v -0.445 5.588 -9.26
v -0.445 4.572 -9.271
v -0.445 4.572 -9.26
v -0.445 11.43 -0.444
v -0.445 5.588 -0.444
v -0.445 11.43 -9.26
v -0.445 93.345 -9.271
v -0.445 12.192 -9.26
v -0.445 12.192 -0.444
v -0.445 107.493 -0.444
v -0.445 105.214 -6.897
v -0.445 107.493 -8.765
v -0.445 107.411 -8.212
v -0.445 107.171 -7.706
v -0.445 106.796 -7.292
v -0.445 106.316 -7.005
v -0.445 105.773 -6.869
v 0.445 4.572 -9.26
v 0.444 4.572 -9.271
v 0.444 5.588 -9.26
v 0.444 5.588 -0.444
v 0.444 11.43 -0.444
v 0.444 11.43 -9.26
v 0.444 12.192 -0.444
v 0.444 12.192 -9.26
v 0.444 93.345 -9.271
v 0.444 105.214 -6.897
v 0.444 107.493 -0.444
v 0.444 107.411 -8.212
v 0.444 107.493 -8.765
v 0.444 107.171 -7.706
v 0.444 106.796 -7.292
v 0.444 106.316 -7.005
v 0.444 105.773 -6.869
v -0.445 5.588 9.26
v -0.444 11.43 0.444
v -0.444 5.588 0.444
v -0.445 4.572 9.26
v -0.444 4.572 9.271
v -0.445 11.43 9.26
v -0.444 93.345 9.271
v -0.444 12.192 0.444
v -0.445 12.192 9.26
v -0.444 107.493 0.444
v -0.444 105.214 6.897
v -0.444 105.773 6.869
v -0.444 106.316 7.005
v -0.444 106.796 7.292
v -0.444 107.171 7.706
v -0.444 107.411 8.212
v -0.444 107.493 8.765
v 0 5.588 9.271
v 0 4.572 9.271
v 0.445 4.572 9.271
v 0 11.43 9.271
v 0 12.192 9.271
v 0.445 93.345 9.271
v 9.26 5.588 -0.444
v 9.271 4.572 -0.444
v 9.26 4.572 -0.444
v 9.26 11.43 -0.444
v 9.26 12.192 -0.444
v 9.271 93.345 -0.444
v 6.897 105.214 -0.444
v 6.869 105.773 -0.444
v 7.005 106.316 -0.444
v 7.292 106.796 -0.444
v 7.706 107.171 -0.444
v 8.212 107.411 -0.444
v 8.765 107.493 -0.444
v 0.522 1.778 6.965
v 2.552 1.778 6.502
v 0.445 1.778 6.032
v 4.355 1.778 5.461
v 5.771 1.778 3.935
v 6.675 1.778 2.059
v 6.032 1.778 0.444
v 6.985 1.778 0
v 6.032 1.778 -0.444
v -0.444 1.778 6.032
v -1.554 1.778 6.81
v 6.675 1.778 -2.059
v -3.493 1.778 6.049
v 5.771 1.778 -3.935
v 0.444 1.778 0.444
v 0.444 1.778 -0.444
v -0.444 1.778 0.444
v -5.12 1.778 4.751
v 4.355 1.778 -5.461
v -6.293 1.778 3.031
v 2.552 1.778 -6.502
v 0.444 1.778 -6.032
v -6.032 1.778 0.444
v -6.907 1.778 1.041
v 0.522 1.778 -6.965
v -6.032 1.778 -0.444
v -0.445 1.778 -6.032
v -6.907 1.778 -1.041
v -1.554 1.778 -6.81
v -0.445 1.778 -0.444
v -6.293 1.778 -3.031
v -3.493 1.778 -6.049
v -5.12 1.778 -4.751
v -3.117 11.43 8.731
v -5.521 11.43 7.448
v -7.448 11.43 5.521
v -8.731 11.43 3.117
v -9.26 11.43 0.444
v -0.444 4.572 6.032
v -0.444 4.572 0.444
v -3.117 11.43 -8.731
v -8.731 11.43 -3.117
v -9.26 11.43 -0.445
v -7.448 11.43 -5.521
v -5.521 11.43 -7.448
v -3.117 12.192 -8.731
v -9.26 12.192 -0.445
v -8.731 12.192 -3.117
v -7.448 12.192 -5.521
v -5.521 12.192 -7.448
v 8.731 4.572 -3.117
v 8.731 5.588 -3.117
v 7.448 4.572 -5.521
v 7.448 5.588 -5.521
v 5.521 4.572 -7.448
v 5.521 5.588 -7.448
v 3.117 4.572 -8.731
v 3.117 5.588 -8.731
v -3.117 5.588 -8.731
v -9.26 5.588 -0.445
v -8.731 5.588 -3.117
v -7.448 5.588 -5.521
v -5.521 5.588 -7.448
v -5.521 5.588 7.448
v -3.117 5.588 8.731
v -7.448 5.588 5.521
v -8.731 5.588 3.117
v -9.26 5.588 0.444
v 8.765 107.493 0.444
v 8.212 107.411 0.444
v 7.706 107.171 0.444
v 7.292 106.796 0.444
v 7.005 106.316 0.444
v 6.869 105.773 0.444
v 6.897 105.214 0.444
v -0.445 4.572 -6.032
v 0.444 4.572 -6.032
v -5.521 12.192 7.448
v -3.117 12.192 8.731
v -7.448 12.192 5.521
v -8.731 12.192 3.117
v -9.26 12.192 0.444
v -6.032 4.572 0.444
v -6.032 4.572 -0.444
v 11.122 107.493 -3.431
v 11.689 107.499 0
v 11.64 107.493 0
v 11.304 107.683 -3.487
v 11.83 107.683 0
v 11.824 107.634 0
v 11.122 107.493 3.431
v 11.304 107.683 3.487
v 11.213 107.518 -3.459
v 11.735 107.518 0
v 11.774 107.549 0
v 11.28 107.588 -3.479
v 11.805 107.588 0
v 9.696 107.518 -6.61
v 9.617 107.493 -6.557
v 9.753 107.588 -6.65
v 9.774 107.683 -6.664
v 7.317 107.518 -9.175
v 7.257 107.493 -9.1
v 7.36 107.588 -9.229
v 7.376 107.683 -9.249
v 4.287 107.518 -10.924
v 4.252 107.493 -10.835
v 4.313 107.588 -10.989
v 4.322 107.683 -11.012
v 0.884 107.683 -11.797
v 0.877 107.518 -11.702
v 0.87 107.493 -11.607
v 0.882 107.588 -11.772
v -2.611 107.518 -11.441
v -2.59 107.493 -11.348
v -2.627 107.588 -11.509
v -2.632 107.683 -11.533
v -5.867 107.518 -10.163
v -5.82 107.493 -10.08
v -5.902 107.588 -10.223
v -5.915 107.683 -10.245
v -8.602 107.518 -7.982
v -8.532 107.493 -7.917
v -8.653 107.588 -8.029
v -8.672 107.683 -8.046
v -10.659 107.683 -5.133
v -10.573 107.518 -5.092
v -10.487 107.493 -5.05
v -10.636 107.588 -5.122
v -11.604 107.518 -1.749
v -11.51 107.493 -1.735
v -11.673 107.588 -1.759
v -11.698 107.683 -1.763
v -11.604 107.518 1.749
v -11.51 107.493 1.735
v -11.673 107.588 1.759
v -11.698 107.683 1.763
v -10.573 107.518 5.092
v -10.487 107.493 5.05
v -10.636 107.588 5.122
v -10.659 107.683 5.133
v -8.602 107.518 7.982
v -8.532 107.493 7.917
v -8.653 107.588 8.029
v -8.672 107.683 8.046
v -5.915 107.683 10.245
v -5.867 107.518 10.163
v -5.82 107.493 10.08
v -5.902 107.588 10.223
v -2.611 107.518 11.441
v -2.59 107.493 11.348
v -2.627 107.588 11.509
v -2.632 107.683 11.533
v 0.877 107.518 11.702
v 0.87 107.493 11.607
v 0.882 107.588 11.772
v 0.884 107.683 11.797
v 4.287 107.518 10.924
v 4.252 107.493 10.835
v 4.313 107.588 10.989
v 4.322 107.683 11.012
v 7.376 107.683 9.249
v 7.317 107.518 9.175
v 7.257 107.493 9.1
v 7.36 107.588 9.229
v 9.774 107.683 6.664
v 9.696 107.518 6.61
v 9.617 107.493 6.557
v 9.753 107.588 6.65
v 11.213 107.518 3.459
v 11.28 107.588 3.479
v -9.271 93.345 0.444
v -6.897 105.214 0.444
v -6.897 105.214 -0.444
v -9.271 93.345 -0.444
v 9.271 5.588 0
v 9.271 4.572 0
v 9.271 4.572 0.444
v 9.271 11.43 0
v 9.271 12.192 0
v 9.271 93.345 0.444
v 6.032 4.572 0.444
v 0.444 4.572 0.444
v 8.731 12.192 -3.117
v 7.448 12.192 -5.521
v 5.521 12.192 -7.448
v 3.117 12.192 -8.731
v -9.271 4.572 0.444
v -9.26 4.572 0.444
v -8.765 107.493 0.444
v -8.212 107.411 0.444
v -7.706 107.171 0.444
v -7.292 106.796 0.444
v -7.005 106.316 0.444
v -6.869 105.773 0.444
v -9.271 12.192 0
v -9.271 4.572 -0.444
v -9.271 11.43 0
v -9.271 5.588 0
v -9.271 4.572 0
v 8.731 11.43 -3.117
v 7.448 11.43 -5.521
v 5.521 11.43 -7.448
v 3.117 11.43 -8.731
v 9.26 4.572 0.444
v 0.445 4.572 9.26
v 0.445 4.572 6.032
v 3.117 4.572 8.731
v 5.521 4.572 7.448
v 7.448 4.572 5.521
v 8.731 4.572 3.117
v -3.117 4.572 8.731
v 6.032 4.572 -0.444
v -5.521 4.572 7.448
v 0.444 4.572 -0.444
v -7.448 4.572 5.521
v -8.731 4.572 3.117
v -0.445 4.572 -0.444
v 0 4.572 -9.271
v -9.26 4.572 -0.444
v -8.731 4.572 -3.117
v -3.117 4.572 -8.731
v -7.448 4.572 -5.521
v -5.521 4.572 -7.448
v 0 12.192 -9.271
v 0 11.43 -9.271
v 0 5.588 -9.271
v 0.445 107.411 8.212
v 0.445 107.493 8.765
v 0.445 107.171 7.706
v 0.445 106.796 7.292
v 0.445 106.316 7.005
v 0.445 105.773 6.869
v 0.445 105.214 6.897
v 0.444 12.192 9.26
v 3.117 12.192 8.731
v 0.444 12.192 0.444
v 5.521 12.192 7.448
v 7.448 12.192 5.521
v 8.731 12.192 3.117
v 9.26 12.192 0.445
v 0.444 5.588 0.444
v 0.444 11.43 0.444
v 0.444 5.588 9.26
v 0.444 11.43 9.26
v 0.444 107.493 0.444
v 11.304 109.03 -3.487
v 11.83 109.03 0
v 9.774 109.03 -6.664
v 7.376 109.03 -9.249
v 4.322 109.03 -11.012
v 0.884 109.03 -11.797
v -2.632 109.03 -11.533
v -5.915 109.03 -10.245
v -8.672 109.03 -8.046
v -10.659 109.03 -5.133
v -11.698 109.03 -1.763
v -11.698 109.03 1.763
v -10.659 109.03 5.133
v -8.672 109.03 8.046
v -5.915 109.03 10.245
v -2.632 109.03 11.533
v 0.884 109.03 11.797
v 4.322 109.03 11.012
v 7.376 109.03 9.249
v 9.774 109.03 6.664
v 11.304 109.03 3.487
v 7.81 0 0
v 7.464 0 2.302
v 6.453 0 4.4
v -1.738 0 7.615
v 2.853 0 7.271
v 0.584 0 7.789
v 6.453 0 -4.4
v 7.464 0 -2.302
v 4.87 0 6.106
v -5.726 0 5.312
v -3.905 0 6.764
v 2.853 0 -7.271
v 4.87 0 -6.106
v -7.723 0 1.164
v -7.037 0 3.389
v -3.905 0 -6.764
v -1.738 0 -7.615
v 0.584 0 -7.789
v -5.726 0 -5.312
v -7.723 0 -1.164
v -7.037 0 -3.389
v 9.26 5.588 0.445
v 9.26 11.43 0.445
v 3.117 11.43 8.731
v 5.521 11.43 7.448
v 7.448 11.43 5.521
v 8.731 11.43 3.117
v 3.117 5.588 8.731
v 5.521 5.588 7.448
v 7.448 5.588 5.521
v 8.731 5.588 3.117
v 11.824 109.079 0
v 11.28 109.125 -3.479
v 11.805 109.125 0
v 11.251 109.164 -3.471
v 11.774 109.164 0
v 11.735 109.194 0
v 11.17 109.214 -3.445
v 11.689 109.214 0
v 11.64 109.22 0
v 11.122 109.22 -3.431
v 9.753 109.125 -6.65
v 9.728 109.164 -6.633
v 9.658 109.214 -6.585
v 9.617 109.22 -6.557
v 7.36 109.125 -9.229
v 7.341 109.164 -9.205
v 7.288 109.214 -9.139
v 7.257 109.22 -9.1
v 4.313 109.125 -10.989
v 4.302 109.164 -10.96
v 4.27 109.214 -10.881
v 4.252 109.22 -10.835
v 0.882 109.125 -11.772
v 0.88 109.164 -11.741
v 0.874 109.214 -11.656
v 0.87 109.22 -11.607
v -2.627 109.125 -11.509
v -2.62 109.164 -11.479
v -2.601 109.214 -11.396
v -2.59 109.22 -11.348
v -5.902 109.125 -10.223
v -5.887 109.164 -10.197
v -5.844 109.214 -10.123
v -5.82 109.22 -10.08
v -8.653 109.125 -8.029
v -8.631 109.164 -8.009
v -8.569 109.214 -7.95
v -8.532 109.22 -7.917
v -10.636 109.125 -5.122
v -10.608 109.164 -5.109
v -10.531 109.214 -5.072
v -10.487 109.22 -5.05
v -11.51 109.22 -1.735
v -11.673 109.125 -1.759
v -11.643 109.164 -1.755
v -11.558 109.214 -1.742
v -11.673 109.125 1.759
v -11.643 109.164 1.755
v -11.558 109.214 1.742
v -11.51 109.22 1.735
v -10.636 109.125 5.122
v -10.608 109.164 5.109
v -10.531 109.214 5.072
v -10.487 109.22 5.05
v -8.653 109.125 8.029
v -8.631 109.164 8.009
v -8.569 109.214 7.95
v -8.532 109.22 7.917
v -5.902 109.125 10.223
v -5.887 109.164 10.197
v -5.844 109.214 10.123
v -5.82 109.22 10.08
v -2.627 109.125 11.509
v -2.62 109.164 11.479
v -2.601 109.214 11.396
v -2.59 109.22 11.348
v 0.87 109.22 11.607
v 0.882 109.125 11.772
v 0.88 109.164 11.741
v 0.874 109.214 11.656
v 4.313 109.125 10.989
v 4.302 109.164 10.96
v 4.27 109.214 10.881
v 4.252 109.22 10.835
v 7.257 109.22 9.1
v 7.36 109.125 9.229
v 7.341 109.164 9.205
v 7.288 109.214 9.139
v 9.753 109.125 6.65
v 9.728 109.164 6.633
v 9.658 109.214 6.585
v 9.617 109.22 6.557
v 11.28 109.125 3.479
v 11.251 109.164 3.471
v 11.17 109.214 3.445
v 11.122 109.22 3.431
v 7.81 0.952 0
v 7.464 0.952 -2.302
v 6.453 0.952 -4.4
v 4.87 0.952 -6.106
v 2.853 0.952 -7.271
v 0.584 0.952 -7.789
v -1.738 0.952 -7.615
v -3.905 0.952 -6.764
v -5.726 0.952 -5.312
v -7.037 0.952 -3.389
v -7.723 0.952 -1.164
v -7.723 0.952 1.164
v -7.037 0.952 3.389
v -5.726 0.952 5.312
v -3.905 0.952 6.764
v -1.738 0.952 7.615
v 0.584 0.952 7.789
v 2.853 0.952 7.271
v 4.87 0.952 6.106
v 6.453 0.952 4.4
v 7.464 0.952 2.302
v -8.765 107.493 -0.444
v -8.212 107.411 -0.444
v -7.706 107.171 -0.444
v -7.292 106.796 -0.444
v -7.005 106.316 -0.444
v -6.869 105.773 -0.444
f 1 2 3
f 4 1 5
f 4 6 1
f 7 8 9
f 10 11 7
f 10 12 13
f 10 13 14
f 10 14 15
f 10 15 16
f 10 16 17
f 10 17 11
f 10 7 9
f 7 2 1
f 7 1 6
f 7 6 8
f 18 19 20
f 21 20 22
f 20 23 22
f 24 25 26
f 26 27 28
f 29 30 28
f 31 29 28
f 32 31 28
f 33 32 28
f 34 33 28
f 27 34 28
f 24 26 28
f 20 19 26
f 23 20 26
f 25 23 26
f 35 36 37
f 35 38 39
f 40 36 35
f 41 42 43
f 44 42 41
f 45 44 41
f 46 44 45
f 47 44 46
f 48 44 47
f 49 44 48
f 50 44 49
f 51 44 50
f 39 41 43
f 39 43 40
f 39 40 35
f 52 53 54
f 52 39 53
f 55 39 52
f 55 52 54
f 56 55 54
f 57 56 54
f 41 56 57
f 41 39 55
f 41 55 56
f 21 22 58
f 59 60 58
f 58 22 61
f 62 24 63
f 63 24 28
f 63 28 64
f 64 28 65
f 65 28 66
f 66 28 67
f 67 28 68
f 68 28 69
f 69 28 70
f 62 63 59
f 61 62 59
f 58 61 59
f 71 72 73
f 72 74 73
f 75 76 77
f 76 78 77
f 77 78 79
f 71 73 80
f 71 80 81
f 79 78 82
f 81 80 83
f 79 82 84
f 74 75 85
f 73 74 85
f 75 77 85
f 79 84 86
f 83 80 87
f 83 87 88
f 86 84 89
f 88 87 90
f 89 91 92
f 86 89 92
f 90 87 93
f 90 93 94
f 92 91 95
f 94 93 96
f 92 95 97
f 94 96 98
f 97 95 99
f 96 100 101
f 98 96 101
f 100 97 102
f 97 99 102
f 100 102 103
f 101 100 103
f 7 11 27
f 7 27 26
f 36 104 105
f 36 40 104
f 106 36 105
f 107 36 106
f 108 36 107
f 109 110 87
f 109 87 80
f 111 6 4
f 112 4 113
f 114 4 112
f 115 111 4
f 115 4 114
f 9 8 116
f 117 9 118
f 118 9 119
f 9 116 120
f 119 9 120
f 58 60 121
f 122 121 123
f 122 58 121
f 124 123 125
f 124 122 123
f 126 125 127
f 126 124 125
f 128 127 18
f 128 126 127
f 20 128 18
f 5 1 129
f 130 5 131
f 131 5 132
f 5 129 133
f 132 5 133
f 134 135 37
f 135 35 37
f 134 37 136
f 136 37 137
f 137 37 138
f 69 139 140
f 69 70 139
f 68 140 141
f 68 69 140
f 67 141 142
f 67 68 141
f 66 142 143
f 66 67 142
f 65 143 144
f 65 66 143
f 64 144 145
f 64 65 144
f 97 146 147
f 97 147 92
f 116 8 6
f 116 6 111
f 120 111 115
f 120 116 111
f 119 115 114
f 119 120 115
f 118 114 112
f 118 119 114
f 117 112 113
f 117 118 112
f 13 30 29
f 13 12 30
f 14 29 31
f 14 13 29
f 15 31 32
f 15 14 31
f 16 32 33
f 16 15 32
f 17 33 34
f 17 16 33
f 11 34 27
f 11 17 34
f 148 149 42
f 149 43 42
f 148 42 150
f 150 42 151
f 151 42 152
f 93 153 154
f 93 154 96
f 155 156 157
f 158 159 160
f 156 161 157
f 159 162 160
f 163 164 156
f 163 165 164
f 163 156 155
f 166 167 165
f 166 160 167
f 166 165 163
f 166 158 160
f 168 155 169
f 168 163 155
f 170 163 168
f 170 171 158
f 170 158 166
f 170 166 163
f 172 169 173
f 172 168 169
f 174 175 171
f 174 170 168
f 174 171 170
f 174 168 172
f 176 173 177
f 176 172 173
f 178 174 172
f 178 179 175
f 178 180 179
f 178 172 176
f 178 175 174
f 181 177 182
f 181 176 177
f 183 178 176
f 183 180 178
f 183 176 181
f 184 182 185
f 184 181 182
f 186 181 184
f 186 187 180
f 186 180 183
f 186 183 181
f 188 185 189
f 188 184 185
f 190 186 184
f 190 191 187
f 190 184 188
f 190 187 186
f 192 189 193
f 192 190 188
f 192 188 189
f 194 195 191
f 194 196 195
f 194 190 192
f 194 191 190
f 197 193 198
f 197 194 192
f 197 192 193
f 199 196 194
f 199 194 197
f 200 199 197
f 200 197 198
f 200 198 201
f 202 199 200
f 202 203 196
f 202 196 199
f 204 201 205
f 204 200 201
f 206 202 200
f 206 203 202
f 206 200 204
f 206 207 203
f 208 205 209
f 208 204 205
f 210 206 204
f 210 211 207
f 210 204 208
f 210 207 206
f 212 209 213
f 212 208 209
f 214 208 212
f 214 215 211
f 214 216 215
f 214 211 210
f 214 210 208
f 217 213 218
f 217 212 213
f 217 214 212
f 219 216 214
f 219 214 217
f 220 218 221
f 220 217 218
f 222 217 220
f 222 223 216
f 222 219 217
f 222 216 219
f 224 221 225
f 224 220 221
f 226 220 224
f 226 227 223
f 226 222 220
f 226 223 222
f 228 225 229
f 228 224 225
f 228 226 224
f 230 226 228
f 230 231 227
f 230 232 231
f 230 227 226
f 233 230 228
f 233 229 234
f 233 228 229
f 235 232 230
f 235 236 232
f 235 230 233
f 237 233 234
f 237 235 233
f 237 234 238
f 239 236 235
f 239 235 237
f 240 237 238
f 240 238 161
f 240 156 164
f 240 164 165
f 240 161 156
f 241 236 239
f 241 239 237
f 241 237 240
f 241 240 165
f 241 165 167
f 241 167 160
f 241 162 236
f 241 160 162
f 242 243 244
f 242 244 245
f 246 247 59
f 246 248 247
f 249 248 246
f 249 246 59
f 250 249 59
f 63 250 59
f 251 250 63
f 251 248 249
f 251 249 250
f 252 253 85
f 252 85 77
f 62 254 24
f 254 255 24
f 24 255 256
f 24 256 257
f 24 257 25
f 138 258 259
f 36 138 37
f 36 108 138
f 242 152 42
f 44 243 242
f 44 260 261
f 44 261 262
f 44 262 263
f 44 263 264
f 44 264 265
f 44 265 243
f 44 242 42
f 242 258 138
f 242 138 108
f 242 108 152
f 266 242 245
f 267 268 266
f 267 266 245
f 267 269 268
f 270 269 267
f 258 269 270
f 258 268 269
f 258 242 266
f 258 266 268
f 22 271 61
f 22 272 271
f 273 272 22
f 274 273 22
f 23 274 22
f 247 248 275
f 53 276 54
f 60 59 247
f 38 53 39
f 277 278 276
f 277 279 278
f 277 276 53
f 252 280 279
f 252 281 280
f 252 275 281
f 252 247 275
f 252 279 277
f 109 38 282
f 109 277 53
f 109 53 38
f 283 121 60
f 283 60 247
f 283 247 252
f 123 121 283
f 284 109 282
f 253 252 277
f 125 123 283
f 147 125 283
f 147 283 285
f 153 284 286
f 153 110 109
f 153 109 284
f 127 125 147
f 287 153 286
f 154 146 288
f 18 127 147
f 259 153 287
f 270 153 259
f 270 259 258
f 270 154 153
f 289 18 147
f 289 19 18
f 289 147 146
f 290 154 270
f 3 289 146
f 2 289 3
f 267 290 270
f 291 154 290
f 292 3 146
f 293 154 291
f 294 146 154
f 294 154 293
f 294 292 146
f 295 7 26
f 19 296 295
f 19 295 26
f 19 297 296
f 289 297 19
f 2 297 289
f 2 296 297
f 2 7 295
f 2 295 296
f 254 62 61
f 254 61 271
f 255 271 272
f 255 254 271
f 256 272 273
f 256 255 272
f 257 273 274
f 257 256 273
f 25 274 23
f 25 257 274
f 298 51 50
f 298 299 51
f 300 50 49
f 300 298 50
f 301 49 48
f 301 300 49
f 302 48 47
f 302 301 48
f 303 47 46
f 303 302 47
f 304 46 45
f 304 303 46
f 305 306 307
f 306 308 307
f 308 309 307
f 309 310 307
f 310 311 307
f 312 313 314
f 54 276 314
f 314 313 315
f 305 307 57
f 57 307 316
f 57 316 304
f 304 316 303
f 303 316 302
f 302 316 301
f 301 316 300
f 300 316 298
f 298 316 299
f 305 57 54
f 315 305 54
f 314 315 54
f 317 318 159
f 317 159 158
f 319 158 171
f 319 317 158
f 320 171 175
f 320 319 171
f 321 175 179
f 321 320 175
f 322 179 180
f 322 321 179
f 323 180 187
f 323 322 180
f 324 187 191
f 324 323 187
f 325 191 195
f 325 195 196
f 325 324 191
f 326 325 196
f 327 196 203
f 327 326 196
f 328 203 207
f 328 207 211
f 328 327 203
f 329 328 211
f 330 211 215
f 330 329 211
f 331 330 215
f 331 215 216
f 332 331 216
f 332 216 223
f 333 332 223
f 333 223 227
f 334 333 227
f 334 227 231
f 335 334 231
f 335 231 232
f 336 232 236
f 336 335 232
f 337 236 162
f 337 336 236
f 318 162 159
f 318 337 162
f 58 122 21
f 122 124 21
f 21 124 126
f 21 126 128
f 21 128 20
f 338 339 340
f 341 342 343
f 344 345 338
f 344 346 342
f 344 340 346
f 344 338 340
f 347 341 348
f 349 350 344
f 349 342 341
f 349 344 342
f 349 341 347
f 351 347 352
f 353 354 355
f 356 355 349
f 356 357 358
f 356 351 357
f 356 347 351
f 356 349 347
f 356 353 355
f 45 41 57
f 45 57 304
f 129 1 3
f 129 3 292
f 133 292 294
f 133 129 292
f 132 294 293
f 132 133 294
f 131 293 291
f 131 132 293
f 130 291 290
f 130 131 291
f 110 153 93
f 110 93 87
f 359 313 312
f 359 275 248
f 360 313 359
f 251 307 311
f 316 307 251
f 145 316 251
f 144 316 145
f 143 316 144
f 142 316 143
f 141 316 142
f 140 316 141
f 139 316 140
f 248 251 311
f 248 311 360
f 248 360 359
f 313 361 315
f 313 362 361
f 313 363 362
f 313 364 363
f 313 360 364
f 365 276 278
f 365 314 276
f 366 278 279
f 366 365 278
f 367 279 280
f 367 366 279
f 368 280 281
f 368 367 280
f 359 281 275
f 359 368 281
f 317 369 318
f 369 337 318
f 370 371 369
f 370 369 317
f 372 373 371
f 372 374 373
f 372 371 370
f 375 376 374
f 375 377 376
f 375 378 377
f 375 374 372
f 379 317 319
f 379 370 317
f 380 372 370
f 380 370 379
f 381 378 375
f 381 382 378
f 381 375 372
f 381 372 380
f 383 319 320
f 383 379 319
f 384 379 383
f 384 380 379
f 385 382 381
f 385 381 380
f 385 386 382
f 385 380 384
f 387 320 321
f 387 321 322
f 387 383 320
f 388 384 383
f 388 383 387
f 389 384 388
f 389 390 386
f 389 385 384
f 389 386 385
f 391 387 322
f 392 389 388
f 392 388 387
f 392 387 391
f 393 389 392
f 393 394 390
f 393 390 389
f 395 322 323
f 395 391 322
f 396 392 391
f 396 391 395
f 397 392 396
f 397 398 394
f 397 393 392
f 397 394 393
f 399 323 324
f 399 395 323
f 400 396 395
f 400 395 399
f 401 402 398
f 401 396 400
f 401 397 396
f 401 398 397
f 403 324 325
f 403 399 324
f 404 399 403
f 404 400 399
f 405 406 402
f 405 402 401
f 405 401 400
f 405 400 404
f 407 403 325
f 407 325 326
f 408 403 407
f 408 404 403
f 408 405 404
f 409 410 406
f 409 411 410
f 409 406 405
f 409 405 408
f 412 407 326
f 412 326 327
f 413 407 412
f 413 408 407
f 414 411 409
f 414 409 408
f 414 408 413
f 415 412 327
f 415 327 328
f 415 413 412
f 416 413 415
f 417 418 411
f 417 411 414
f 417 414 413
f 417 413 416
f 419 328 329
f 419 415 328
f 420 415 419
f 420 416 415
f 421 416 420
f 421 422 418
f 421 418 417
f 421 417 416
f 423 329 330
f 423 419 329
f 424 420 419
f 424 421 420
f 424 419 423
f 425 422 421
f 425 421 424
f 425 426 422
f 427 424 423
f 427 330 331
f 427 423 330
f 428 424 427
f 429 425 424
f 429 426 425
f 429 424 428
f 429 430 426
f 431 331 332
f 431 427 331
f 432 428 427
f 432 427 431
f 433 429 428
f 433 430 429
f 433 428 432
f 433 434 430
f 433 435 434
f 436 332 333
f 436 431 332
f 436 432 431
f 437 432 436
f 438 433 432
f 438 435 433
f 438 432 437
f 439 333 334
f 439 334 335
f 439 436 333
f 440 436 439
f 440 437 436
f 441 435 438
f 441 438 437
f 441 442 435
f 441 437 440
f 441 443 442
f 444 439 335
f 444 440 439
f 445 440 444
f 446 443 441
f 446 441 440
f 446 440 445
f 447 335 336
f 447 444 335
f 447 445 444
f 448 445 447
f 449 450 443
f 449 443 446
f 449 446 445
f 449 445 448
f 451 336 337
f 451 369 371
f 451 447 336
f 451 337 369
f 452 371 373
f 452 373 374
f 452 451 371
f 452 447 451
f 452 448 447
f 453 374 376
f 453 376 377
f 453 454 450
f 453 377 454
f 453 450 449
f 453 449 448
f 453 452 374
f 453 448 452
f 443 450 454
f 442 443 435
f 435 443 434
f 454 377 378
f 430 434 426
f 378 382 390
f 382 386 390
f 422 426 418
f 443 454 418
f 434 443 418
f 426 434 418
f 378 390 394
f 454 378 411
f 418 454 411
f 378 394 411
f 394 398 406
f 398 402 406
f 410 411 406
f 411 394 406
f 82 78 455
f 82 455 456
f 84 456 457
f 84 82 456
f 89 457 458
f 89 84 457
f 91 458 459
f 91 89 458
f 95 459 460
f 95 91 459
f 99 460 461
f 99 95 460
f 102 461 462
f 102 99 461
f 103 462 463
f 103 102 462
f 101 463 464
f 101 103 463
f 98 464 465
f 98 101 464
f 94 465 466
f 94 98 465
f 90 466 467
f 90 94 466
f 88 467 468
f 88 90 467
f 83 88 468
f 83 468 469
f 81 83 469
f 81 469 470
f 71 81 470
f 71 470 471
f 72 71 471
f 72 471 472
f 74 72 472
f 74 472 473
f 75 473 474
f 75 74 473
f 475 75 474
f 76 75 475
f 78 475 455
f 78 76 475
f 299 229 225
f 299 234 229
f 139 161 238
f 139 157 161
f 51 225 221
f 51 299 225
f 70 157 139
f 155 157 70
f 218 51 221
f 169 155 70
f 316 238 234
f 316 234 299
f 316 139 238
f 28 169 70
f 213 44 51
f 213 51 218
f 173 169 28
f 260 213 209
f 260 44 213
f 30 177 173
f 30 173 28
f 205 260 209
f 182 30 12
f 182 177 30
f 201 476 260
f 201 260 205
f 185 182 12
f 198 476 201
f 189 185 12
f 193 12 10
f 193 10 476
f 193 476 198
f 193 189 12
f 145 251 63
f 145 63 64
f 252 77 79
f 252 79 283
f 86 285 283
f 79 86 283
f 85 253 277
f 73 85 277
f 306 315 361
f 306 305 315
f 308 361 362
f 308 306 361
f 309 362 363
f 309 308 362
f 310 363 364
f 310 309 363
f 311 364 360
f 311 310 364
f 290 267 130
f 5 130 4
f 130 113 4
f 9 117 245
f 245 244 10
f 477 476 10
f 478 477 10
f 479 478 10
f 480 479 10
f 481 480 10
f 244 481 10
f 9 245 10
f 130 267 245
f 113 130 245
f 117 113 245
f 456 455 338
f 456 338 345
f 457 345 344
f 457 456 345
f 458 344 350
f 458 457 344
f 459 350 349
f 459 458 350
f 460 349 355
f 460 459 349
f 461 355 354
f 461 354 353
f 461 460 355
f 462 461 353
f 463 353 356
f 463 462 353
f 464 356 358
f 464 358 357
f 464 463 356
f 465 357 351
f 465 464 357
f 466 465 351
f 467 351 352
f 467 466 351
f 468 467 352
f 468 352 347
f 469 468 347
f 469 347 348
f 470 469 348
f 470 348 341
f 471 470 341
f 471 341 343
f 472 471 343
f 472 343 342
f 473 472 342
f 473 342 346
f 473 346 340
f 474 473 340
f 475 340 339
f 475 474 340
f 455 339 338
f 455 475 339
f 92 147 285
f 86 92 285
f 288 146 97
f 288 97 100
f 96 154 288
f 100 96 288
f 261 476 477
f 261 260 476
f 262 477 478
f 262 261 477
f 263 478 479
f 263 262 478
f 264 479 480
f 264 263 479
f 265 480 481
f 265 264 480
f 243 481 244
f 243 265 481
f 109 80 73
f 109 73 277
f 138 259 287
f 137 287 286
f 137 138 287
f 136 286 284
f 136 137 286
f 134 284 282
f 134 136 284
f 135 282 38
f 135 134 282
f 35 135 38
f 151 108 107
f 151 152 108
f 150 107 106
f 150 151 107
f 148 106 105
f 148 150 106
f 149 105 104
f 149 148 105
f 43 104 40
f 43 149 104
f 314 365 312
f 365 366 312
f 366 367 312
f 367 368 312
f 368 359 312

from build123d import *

# Parameters (mm, degrees)
EXTRUDE1_DEPTH    = 0.4445
CIRPATTERN1_COUNT = 2
CIRPATTERN1_ANGLE = 90
SKETCH2_W         = 7.8105
SKETCH2_H         = 1.778
SKETCH2_W_2       = 9.271
SKETCH2_H_2       = 1.016
SKETCH2_H_3       = 0.762
SKETCH2_W_3       = 11.83005
SKETCH2_H_4       = 1.7272
CHAMFER1_SIZE     = 0.8255
FILLET1_R         = 1.905
FILLET2_R         = 0.1905


with BuildPart() as part:
    # Sketch1 → Extrude1 (new, symmetric)
    with BuildSketch(Plane.XY):
        Polygon((-6.0325, 0), (6.0325, 0), (6.0325, 4.572), (9.271, 4.572), (9.271, 93.345), (6.096, 109.22), (-6.096, 109.22), (-9.271, 93.345), (-9.271, 4.572), (-6.0325, 4.572), align=None)
    extrude1 = extrude(amount=EXTRUDE1_DEPTH, both=True)

    # CirPattern1: Extrude1 ×2 about axis
    cirpattern1_axis = Axis((0, 50, 0), (0, -1, 0))
    for i in range(1, CIRPATTERN1_COUNT):
        add(extrude1.rotate(cirpattern1_axis, i * CIRPATTERN1_ANGLE / (CIRPATTERN1_COUNT - 1)))

    # Sketch2 → Revolve1 (revolve)
    with BuildSketch(Plane.XY):
        with Locations((3.90525, 0.889)):
            Rectangle(SKETCH2_W, SKETCH2_H)
        with Locations((4.6355, 5.08)):
            Rectangle(SKETCH2_W_2, SKETCH2_H_2)
        with Locations((4.6355, 11.811)):
            Rectangle(SKETCH2_W_2, SKETCH2_H_3)
        with Locations((5.915025, 108.3564)):
            Rectangle(SKETCH2_W_3, SKETCH2_H_4)
    revolve(axis=Axis((0, 0, 0), (0, 1, 0)))

    # Chamfer1
    chamfer1_edges = [part.edges().sort_by_distance(p)[0] for p in [
        (-7.8105, 1.778, 0),
    ]]
    chamfer(chamfer1_edges, length=CHAMFER1_SIZE)

    # Fillet1
    fillet1_edges = [part.edges().sort_by_distance(p)[0] for p in [
        (0, 107.4928, -6.44144),
        (-6.44144, 107.4928, 0),
        (0, 107.4928, 6.44144),
        (6.44144, 107.4928, 0),
    ]]
    fillet(fillet1_edges, radius=FILLET1_R)

    # Fillet2
    fillet2_edges = [part.edges().sort_by_distance(p)[0] for p in [
        (-11.83005, 107.4928, 0),
        (-11.83005, 109.22, 0),
    ]]
    fillet(fillet2_edges, radius=FILLET2_R)


solid = part.part
